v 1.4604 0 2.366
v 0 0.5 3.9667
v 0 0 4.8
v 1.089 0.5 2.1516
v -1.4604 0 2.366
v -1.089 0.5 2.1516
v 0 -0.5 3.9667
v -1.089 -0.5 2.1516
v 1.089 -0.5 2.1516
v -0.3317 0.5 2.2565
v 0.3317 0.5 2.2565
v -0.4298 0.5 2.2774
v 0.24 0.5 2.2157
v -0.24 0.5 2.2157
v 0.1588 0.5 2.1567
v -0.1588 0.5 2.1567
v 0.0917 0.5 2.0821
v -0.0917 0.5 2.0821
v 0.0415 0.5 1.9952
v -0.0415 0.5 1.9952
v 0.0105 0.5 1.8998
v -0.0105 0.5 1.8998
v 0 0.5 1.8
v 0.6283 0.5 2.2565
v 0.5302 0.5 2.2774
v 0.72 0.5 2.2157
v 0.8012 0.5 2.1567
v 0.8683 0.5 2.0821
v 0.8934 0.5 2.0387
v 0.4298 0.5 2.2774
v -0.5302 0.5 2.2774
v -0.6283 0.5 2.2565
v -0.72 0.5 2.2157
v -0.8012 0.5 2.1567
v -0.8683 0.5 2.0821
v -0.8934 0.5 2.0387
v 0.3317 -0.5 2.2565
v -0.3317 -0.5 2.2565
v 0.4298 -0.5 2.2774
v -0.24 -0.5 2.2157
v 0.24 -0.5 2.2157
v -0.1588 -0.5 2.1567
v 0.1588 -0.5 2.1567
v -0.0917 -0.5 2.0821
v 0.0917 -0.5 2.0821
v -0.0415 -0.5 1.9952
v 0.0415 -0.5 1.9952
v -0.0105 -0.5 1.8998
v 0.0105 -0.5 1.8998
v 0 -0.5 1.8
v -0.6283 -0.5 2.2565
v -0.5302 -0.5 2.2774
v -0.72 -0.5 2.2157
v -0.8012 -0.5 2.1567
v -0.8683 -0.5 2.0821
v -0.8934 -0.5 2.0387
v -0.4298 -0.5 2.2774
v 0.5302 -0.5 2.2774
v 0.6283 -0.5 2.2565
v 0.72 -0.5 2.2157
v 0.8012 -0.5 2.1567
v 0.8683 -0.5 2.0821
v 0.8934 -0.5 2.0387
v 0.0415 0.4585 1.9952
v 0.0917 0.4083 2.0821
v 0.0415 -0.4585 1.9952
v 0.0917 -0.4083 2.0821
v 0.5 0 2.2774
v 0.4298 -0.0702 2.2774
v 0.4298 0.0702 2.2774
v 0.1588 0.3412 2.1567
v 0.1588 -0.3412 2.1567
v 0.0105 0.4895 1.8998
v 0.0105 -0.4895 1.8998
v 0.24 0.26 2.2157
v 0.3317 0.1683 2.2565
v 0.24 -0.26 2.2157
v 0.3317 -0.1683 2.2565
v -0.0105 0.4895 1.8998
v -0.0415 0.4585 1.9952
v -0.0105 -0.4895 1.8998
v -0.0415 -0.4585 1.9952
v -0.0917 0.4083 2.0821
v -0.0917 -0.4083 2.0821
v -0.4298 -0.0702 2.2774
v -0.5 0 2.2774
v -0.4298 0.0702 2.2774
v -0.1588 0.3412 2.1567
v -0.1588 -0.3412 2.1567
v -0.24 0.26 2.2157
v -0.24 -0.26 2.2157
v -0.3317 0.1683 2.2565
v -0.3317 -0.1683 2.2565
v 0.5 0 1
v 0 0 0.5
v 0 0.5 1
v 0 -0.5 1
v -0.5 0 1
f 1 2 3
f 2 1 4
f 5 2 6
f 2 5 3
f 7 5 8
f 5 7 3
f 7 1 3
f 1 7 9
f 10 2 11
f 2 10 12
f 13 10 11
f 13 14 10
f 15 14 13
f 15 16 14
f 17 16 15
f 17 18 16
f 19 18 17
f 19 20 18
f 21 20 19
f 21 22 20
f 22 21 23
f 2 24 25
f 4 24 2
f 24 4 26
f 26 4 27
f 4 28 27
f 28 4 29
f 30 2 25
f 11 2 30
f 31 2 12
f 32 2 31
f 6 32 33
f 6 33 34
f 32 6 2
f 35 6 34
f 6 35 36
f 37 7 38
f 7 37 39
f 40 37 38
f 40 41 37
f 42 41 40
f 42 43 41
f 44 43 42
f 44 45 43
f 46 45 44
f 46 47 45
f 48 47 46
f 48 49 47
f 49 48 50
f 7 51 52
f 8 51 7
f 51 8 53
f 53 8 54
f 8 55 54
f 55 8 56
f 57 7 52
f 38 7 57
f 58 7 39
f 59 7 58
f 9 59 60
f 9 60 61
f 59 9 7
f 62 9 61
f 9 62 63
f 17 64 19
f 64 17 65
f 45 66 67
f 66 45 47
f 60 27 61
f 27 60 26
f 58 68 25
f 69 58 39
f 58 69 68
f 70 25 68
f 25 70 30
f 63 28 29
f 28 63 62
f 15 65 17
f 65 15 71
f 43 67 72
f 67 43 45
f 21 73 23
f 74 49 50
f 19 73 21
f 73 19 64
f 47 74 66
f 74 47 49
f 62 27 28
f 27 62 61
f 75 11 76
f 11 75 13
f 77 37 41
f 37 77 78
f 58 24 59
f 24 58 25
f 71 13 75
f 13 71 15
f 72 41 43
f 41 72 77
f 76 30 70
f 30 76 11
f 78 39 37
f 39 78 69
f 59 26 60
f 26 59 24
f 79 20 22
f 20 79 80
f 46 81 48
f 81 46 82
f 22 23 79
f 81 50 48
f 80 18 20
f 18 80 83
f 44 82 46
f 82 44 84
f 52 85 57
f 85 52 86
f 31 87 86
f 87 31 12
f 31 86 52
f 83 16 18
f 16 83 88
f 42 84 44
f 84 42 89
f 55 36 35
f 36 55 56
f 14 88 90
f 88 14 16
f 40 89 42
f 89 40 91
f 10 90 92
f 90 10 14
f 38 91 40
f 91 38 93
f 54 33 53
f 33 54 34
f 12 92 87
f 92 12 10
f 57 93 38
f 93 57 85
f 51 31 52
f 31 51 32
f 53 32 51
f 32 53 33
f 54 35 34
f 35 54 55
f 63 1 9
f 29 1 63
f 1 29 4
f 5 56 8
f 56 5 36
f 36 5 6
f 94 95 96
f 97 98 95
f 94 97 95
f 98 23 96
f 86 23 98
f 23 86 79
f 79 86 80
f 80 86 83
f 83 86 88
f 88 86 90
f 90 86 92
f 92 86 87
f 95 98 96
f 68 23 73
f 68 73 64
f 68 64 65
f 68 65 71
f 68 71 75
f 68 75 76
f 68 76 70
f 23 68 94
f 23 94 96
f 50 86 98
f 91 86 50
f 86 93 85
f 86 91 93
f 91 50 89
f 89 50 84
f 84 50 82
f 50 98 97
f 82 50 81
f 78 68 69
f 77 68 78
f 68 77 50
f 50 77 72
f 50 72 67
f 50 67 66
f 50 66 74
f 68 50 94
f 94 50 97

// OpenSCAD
module Spike(thickness=1, size=6)
{
	hull()
	{
		translate([0, 0, thickness]) D8(s=thickness/2);
		translate([0, 0, 0.5*size]) D8(s=thickness/2);
	}
	
	translate([0, 0, size*0.3])
	difference()
	{
		intersection()
		{
			intersection()
			{
				resize([size*0.6, size*0.6, size]) D8();
				cube(size=[2*size, thickness, 2*size], center=true);
			}
			translate([0, 0, 4*size]) cube(size=8*size, center=true);
		}
		hole = size*0.08;
		translate([ hole,0,0]) rotate([90,0,0]) cylinder(h=2*thickness, d=2*hole, center=true, $fn=30);
		translate([-hole,0,0]) rotate([90,0,0]) cylinder(h=2*thickness, d=2*hole, center=true, $fn=30);
		translate([ hole,0,0]) rotate([0,-30,0]) translate([0, 0, -4*size]) cube(size=8*size, center=true);
		translate([-hole,0,0]) rotate([0, 30,0]) translate([0, 0, -4*size]) cube(size=8*size, center=true);
	}
};


module D8(s=1)
{
	points = [
		[ 0, 0, s ],
		[ s, 0, 0 ],
		[ 0, s, 0 ],
		[-s, 0, 0 ],
		[ 0,-s, 0 ],
		[ 0, 0,-s ]];
	faces = [
		[ 0, 1, 2 ],
		[ 0, 2, 3 ],
		[ 0, 3, 4 ],
		[ 0, 4, 1 ],
		[ 5, 1, 4 ],
		[ 5, 4, 3 ],
		[ 5, 3, 2 ],
		[ 5, 2, 1 ]];
	polyhedron(points, faces, 10);	
};

Spike();
